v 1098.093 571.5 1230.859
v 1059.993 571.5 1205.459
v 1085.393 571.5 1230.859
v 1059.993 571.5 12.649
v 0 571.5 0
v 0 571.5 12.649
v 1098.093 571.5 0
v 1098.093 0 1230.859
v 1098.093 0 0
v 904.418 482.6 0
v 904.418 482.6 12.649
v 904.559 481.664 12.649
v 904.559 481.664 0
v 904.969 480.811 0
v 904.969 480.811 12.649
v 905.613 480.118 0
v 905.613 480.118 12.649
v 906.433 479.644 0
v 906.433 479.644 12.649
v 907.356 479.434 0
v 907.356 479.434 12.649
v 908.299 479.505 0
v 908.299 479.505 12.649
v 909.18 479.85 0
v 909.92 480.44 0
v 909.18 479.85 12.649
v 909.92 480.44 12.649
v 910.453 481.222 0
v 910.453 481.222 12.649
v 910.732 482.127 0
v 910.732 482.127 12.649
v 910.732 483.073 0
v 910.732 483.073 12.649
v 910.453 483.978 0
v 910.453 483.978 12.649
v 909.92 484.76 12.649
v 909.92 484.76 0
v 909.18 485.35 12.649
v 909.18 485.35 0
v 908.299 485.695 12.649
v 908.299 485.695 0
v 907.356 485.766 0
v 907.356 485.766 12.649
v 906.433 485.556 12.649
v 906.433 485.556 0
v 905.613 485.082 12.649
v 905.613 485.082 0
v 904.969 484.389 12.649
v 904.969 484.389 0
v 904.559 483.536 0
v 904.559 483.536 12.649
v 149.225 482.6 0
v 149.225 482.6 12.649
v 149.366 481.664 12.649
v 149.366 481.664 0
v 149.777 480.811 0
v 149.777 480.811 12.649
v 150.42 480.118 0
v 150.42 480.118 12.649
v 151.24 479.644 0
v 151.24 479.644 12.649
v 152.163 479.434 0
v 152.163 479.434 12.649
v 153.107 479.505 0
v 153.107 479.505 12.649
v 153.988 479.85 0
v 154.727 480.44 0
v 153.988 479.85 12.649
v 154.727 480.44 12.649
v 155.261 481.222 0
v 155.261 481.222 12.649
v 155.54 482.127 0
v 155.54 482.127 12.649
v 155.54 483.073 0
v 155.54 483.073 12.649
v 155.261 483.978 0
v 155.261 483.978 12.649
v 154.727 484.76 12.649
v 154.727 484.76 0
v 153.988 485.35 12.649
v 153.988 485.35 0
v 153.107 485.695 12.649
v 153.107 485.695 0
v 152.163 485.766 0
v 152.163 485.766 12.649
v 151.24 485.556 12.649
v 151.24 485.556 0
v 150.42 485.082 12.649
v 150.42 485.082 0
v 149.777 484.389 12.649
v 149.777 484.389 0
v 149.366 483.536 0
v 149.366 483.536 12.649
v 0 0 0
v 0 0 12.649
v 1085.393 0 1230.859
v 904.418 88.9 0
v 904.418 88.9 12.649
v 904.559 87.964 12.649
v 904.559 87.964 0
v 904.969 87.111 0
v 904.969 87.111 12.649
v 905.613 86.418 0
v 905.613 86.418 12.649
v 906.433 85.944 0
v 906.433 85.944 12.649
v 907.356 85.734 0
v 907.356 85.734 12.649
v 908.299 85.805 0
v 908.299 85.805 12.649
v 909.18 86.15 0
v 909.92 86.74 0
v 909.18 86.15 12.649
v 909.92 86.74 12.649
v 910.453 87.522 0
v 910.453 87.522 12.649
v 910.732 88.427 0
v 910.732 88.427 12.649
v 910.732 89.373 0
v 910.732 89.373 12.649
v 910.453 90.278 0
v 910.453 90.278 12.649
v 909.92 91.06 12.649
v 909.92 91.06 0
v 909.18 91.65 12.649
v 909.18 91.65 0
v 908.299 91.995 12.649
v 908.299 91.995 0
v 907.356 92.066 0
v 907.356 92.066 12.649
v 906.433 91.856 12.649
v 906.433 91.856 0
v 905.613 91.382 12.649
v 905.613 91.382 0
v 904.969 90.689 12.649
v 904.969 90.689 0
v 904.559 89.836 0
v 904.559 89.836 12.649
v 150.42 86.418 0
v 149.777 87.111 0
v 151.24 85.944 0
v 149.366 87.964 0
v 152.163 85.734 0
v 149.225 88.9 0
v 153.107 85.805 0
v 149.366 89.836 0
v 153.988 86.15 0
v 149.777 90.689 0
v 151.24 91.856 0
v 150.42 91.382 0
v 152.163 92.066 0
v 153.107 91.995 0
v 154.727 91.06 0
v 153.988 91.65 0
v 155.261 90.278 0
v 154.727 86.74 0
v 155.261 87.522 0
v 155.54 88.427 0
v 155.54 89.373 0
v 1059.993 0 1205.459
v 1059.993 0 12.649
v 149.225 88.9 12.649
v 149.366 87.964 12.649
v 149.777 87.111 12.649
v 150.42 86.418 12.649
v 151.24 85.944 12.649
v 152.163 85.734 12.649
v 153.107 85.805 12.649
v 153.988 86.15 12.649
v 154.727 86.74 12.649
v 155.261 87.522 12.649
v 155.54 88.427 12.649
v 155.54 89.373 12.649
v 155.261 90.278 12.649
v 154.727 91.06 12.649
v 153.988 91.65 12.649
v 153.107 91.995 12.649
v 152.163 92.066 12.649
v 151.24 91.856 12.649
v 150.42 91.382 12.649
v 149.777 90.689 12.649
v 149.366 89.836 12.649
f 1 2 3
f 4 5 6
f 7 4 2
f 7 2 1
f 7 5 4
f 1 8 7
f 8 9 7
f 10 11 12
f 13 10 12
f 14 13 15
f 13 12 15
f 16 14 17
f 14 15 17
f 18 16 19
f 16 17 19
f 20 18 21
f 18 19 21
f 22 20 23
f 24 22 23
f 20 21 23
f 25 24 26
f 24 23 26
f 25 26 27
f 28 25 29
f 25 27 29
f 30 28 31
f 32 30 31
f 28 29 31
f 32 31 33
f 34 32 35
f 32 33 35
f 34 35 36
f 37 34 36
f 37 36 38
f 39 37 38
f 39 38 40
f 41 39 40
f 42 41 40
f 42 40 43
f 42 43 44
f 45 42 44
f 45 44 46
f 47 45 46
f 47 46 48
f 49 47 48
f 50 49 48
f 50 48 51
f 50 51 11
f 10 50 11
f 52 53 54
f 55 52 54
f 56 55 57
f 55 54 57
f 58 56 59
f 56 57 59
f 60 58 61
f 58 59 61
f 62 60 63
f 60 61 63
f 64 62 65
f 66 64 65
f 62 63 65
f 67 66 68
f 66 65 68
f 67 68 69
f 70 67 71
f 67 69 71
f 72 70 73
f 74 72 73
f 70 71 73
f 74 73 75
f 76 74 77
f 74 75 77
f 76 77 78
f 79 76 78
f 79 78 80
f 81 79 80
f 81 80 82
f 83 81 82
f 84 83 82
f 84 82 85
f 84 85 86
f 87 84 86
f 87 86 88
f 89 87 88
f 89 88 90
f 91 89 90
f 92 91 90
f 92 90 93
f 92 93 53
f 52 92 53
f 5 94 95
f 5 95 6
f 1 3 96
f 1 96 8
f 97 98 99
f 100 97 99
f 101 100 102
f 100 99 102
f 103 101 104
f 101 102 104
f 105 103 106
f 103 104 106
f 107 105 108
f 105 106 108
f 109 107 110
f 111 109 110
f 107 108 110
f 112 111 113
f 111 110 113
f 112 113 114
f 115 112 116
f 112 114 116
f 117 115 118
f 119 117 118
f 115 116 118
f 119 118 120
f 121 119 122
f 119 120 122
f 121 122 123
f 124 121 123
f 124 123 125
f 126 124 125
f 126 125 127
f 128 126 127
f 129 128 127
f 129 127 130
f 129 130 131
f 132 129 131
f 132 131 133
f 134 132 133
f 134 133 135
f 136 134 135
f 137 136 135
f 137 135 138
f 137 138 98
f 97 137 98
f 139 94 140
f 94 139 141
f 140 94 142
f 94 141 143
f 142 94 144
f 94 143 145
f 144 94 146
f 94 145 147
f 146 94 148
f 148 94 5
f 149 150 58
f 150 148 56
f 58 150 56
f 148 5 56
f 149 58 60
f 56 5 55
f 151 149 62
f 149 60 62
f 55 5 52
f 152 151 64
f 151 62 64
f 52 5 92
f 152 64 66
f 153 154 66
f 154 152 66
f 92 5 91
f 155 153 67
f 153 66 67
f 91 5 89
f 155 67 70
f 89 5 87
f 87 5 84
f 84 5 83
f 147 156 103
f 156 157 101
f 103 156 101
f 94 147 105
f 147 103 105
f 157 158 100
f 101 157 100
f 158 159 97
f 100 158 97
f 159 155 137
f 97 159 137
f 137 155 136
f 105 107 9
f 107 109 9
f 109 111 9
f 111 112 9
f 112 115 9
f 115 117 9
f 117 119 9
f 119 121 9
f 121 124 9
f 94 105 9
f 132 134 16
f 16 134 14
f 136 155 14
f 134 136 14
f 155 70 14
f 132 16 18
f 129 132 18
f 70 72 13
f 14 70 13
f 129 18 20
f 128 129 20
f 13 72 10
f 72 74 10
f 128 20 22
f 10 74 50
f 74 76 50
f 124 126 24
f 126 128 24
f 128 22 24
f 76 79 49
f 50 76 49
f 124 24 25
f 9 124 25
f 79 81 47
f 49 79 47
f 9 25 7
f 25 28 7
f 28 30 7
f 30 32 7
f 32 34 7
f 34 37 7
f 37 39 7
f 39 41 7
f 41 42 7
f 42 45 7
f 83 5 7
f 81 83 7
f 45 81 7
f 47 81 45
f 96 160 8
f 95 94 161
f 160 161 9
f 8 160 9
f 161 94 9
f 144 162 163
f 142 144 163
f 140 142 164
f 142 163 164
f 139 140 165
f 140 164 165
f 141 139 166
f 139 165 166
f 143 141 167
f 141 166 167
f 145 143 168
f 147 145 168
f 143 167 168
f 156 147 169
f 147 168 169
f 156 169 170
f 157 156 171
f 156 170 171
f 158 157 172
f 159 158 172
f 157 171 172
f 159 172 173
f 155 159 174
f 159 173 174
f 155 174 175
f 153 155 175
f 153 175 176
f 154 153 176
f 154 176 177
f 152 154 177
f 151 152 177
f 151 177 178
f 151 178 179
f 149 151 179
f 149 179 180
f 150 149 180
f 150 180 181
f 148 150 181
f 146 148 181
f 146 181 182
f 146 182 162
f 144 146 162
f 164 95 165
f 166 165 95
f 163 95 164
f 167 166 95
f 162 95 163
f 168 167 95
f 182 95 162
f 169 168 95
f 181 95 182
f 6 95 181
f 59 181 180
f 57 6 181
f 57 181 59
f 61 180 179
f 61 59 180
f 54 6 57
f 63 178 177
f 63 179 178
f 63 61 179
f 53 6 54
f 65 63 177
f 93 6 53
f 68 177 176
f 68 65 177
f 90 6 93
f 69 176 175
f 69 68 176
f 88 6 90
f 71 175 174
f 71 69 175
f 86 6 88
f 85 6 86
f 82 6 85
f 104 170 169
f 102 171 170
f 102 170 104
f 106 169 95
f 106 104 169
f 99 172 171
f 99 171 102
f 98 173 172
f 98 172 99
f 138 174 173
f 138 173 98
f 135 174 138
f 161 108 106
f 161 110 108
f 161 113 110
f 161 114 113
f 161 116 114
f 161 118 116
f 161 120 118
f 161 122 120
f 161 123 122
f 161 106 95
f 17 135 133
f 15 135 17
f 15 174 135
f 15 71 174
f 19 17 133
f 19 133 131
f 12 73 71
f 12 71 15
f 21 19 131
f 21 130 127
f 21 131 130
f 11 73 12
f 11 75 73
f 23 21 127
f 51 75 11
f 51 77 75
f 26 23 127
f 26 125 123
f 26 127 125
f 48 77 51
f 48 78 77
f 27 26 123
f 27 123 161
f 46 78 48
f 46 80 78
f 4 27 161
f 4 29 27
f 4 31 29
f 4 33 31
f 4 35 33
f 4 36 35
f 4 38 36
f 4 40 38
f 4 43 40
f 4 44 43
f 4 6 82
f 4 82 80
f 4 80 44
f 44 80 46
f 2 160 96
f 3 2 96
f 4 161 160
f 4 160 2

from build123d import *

# Parameters (mm, degrees)
F0_W     = 1098.0928
F0_H     = 571.5
F1_DEPTH = 12.6492
F2_W     = 38.1
F2_H     = 571.5
F3_DEPTH = 1218.2094
F5_DEPTH = 1270
F6_D     = 6.35
F6_DEPTH = 25.4
F6_TIP   = 1.9077324654


with BuildPart() as f1:
    # F0 (on Top) → F1 (new body)
    with BuildSketch(Plane.XY):
        with Locations((549.0464, 285.75)):
            Rectangle(F0_W, F0_H)
    extrude(amount=F1_DEPTH)

    # F2 (on face) → F3 (join)
    with BuildSketch(Plane.XY.offset(12.6492)):
        with Locations((1079.0428, 285.75)):
            Rectangle(F2_W, F2_H)
    extrude(amount=F3_DEPTH)

    # F4 (on face) → F5 (cut)
    with BuildSketch(Plane.XZ):
        Polygon((1059.9928, 1205.4586), (1085.3928, 1230.8586), (1059.9928, 1230.8586), align=None)
    extrude(amount=-F5_DEPTH, mode=Mode.SUBTRACT)

    # F6
    with Locations(Plane(origin=(0, 0, 0), x_dir=(1, 0, 0), z_dir=(0, 0, -1))):
        with Locations((152.4, -482.6), (907.5928, -482.6), (907.5928, -88.9), (152.4, -88.9)):
            Hole(F6_D / 2, depth=F6_DEPTH)
            with Locations((0, 0, -(F6_DEPTH + F6_TIP / 2))):  # 118° drill point
                Cone(0, F6_D / 2, F6_TIP, mode=Mode.SUBTRACT)


solid = f1.part
